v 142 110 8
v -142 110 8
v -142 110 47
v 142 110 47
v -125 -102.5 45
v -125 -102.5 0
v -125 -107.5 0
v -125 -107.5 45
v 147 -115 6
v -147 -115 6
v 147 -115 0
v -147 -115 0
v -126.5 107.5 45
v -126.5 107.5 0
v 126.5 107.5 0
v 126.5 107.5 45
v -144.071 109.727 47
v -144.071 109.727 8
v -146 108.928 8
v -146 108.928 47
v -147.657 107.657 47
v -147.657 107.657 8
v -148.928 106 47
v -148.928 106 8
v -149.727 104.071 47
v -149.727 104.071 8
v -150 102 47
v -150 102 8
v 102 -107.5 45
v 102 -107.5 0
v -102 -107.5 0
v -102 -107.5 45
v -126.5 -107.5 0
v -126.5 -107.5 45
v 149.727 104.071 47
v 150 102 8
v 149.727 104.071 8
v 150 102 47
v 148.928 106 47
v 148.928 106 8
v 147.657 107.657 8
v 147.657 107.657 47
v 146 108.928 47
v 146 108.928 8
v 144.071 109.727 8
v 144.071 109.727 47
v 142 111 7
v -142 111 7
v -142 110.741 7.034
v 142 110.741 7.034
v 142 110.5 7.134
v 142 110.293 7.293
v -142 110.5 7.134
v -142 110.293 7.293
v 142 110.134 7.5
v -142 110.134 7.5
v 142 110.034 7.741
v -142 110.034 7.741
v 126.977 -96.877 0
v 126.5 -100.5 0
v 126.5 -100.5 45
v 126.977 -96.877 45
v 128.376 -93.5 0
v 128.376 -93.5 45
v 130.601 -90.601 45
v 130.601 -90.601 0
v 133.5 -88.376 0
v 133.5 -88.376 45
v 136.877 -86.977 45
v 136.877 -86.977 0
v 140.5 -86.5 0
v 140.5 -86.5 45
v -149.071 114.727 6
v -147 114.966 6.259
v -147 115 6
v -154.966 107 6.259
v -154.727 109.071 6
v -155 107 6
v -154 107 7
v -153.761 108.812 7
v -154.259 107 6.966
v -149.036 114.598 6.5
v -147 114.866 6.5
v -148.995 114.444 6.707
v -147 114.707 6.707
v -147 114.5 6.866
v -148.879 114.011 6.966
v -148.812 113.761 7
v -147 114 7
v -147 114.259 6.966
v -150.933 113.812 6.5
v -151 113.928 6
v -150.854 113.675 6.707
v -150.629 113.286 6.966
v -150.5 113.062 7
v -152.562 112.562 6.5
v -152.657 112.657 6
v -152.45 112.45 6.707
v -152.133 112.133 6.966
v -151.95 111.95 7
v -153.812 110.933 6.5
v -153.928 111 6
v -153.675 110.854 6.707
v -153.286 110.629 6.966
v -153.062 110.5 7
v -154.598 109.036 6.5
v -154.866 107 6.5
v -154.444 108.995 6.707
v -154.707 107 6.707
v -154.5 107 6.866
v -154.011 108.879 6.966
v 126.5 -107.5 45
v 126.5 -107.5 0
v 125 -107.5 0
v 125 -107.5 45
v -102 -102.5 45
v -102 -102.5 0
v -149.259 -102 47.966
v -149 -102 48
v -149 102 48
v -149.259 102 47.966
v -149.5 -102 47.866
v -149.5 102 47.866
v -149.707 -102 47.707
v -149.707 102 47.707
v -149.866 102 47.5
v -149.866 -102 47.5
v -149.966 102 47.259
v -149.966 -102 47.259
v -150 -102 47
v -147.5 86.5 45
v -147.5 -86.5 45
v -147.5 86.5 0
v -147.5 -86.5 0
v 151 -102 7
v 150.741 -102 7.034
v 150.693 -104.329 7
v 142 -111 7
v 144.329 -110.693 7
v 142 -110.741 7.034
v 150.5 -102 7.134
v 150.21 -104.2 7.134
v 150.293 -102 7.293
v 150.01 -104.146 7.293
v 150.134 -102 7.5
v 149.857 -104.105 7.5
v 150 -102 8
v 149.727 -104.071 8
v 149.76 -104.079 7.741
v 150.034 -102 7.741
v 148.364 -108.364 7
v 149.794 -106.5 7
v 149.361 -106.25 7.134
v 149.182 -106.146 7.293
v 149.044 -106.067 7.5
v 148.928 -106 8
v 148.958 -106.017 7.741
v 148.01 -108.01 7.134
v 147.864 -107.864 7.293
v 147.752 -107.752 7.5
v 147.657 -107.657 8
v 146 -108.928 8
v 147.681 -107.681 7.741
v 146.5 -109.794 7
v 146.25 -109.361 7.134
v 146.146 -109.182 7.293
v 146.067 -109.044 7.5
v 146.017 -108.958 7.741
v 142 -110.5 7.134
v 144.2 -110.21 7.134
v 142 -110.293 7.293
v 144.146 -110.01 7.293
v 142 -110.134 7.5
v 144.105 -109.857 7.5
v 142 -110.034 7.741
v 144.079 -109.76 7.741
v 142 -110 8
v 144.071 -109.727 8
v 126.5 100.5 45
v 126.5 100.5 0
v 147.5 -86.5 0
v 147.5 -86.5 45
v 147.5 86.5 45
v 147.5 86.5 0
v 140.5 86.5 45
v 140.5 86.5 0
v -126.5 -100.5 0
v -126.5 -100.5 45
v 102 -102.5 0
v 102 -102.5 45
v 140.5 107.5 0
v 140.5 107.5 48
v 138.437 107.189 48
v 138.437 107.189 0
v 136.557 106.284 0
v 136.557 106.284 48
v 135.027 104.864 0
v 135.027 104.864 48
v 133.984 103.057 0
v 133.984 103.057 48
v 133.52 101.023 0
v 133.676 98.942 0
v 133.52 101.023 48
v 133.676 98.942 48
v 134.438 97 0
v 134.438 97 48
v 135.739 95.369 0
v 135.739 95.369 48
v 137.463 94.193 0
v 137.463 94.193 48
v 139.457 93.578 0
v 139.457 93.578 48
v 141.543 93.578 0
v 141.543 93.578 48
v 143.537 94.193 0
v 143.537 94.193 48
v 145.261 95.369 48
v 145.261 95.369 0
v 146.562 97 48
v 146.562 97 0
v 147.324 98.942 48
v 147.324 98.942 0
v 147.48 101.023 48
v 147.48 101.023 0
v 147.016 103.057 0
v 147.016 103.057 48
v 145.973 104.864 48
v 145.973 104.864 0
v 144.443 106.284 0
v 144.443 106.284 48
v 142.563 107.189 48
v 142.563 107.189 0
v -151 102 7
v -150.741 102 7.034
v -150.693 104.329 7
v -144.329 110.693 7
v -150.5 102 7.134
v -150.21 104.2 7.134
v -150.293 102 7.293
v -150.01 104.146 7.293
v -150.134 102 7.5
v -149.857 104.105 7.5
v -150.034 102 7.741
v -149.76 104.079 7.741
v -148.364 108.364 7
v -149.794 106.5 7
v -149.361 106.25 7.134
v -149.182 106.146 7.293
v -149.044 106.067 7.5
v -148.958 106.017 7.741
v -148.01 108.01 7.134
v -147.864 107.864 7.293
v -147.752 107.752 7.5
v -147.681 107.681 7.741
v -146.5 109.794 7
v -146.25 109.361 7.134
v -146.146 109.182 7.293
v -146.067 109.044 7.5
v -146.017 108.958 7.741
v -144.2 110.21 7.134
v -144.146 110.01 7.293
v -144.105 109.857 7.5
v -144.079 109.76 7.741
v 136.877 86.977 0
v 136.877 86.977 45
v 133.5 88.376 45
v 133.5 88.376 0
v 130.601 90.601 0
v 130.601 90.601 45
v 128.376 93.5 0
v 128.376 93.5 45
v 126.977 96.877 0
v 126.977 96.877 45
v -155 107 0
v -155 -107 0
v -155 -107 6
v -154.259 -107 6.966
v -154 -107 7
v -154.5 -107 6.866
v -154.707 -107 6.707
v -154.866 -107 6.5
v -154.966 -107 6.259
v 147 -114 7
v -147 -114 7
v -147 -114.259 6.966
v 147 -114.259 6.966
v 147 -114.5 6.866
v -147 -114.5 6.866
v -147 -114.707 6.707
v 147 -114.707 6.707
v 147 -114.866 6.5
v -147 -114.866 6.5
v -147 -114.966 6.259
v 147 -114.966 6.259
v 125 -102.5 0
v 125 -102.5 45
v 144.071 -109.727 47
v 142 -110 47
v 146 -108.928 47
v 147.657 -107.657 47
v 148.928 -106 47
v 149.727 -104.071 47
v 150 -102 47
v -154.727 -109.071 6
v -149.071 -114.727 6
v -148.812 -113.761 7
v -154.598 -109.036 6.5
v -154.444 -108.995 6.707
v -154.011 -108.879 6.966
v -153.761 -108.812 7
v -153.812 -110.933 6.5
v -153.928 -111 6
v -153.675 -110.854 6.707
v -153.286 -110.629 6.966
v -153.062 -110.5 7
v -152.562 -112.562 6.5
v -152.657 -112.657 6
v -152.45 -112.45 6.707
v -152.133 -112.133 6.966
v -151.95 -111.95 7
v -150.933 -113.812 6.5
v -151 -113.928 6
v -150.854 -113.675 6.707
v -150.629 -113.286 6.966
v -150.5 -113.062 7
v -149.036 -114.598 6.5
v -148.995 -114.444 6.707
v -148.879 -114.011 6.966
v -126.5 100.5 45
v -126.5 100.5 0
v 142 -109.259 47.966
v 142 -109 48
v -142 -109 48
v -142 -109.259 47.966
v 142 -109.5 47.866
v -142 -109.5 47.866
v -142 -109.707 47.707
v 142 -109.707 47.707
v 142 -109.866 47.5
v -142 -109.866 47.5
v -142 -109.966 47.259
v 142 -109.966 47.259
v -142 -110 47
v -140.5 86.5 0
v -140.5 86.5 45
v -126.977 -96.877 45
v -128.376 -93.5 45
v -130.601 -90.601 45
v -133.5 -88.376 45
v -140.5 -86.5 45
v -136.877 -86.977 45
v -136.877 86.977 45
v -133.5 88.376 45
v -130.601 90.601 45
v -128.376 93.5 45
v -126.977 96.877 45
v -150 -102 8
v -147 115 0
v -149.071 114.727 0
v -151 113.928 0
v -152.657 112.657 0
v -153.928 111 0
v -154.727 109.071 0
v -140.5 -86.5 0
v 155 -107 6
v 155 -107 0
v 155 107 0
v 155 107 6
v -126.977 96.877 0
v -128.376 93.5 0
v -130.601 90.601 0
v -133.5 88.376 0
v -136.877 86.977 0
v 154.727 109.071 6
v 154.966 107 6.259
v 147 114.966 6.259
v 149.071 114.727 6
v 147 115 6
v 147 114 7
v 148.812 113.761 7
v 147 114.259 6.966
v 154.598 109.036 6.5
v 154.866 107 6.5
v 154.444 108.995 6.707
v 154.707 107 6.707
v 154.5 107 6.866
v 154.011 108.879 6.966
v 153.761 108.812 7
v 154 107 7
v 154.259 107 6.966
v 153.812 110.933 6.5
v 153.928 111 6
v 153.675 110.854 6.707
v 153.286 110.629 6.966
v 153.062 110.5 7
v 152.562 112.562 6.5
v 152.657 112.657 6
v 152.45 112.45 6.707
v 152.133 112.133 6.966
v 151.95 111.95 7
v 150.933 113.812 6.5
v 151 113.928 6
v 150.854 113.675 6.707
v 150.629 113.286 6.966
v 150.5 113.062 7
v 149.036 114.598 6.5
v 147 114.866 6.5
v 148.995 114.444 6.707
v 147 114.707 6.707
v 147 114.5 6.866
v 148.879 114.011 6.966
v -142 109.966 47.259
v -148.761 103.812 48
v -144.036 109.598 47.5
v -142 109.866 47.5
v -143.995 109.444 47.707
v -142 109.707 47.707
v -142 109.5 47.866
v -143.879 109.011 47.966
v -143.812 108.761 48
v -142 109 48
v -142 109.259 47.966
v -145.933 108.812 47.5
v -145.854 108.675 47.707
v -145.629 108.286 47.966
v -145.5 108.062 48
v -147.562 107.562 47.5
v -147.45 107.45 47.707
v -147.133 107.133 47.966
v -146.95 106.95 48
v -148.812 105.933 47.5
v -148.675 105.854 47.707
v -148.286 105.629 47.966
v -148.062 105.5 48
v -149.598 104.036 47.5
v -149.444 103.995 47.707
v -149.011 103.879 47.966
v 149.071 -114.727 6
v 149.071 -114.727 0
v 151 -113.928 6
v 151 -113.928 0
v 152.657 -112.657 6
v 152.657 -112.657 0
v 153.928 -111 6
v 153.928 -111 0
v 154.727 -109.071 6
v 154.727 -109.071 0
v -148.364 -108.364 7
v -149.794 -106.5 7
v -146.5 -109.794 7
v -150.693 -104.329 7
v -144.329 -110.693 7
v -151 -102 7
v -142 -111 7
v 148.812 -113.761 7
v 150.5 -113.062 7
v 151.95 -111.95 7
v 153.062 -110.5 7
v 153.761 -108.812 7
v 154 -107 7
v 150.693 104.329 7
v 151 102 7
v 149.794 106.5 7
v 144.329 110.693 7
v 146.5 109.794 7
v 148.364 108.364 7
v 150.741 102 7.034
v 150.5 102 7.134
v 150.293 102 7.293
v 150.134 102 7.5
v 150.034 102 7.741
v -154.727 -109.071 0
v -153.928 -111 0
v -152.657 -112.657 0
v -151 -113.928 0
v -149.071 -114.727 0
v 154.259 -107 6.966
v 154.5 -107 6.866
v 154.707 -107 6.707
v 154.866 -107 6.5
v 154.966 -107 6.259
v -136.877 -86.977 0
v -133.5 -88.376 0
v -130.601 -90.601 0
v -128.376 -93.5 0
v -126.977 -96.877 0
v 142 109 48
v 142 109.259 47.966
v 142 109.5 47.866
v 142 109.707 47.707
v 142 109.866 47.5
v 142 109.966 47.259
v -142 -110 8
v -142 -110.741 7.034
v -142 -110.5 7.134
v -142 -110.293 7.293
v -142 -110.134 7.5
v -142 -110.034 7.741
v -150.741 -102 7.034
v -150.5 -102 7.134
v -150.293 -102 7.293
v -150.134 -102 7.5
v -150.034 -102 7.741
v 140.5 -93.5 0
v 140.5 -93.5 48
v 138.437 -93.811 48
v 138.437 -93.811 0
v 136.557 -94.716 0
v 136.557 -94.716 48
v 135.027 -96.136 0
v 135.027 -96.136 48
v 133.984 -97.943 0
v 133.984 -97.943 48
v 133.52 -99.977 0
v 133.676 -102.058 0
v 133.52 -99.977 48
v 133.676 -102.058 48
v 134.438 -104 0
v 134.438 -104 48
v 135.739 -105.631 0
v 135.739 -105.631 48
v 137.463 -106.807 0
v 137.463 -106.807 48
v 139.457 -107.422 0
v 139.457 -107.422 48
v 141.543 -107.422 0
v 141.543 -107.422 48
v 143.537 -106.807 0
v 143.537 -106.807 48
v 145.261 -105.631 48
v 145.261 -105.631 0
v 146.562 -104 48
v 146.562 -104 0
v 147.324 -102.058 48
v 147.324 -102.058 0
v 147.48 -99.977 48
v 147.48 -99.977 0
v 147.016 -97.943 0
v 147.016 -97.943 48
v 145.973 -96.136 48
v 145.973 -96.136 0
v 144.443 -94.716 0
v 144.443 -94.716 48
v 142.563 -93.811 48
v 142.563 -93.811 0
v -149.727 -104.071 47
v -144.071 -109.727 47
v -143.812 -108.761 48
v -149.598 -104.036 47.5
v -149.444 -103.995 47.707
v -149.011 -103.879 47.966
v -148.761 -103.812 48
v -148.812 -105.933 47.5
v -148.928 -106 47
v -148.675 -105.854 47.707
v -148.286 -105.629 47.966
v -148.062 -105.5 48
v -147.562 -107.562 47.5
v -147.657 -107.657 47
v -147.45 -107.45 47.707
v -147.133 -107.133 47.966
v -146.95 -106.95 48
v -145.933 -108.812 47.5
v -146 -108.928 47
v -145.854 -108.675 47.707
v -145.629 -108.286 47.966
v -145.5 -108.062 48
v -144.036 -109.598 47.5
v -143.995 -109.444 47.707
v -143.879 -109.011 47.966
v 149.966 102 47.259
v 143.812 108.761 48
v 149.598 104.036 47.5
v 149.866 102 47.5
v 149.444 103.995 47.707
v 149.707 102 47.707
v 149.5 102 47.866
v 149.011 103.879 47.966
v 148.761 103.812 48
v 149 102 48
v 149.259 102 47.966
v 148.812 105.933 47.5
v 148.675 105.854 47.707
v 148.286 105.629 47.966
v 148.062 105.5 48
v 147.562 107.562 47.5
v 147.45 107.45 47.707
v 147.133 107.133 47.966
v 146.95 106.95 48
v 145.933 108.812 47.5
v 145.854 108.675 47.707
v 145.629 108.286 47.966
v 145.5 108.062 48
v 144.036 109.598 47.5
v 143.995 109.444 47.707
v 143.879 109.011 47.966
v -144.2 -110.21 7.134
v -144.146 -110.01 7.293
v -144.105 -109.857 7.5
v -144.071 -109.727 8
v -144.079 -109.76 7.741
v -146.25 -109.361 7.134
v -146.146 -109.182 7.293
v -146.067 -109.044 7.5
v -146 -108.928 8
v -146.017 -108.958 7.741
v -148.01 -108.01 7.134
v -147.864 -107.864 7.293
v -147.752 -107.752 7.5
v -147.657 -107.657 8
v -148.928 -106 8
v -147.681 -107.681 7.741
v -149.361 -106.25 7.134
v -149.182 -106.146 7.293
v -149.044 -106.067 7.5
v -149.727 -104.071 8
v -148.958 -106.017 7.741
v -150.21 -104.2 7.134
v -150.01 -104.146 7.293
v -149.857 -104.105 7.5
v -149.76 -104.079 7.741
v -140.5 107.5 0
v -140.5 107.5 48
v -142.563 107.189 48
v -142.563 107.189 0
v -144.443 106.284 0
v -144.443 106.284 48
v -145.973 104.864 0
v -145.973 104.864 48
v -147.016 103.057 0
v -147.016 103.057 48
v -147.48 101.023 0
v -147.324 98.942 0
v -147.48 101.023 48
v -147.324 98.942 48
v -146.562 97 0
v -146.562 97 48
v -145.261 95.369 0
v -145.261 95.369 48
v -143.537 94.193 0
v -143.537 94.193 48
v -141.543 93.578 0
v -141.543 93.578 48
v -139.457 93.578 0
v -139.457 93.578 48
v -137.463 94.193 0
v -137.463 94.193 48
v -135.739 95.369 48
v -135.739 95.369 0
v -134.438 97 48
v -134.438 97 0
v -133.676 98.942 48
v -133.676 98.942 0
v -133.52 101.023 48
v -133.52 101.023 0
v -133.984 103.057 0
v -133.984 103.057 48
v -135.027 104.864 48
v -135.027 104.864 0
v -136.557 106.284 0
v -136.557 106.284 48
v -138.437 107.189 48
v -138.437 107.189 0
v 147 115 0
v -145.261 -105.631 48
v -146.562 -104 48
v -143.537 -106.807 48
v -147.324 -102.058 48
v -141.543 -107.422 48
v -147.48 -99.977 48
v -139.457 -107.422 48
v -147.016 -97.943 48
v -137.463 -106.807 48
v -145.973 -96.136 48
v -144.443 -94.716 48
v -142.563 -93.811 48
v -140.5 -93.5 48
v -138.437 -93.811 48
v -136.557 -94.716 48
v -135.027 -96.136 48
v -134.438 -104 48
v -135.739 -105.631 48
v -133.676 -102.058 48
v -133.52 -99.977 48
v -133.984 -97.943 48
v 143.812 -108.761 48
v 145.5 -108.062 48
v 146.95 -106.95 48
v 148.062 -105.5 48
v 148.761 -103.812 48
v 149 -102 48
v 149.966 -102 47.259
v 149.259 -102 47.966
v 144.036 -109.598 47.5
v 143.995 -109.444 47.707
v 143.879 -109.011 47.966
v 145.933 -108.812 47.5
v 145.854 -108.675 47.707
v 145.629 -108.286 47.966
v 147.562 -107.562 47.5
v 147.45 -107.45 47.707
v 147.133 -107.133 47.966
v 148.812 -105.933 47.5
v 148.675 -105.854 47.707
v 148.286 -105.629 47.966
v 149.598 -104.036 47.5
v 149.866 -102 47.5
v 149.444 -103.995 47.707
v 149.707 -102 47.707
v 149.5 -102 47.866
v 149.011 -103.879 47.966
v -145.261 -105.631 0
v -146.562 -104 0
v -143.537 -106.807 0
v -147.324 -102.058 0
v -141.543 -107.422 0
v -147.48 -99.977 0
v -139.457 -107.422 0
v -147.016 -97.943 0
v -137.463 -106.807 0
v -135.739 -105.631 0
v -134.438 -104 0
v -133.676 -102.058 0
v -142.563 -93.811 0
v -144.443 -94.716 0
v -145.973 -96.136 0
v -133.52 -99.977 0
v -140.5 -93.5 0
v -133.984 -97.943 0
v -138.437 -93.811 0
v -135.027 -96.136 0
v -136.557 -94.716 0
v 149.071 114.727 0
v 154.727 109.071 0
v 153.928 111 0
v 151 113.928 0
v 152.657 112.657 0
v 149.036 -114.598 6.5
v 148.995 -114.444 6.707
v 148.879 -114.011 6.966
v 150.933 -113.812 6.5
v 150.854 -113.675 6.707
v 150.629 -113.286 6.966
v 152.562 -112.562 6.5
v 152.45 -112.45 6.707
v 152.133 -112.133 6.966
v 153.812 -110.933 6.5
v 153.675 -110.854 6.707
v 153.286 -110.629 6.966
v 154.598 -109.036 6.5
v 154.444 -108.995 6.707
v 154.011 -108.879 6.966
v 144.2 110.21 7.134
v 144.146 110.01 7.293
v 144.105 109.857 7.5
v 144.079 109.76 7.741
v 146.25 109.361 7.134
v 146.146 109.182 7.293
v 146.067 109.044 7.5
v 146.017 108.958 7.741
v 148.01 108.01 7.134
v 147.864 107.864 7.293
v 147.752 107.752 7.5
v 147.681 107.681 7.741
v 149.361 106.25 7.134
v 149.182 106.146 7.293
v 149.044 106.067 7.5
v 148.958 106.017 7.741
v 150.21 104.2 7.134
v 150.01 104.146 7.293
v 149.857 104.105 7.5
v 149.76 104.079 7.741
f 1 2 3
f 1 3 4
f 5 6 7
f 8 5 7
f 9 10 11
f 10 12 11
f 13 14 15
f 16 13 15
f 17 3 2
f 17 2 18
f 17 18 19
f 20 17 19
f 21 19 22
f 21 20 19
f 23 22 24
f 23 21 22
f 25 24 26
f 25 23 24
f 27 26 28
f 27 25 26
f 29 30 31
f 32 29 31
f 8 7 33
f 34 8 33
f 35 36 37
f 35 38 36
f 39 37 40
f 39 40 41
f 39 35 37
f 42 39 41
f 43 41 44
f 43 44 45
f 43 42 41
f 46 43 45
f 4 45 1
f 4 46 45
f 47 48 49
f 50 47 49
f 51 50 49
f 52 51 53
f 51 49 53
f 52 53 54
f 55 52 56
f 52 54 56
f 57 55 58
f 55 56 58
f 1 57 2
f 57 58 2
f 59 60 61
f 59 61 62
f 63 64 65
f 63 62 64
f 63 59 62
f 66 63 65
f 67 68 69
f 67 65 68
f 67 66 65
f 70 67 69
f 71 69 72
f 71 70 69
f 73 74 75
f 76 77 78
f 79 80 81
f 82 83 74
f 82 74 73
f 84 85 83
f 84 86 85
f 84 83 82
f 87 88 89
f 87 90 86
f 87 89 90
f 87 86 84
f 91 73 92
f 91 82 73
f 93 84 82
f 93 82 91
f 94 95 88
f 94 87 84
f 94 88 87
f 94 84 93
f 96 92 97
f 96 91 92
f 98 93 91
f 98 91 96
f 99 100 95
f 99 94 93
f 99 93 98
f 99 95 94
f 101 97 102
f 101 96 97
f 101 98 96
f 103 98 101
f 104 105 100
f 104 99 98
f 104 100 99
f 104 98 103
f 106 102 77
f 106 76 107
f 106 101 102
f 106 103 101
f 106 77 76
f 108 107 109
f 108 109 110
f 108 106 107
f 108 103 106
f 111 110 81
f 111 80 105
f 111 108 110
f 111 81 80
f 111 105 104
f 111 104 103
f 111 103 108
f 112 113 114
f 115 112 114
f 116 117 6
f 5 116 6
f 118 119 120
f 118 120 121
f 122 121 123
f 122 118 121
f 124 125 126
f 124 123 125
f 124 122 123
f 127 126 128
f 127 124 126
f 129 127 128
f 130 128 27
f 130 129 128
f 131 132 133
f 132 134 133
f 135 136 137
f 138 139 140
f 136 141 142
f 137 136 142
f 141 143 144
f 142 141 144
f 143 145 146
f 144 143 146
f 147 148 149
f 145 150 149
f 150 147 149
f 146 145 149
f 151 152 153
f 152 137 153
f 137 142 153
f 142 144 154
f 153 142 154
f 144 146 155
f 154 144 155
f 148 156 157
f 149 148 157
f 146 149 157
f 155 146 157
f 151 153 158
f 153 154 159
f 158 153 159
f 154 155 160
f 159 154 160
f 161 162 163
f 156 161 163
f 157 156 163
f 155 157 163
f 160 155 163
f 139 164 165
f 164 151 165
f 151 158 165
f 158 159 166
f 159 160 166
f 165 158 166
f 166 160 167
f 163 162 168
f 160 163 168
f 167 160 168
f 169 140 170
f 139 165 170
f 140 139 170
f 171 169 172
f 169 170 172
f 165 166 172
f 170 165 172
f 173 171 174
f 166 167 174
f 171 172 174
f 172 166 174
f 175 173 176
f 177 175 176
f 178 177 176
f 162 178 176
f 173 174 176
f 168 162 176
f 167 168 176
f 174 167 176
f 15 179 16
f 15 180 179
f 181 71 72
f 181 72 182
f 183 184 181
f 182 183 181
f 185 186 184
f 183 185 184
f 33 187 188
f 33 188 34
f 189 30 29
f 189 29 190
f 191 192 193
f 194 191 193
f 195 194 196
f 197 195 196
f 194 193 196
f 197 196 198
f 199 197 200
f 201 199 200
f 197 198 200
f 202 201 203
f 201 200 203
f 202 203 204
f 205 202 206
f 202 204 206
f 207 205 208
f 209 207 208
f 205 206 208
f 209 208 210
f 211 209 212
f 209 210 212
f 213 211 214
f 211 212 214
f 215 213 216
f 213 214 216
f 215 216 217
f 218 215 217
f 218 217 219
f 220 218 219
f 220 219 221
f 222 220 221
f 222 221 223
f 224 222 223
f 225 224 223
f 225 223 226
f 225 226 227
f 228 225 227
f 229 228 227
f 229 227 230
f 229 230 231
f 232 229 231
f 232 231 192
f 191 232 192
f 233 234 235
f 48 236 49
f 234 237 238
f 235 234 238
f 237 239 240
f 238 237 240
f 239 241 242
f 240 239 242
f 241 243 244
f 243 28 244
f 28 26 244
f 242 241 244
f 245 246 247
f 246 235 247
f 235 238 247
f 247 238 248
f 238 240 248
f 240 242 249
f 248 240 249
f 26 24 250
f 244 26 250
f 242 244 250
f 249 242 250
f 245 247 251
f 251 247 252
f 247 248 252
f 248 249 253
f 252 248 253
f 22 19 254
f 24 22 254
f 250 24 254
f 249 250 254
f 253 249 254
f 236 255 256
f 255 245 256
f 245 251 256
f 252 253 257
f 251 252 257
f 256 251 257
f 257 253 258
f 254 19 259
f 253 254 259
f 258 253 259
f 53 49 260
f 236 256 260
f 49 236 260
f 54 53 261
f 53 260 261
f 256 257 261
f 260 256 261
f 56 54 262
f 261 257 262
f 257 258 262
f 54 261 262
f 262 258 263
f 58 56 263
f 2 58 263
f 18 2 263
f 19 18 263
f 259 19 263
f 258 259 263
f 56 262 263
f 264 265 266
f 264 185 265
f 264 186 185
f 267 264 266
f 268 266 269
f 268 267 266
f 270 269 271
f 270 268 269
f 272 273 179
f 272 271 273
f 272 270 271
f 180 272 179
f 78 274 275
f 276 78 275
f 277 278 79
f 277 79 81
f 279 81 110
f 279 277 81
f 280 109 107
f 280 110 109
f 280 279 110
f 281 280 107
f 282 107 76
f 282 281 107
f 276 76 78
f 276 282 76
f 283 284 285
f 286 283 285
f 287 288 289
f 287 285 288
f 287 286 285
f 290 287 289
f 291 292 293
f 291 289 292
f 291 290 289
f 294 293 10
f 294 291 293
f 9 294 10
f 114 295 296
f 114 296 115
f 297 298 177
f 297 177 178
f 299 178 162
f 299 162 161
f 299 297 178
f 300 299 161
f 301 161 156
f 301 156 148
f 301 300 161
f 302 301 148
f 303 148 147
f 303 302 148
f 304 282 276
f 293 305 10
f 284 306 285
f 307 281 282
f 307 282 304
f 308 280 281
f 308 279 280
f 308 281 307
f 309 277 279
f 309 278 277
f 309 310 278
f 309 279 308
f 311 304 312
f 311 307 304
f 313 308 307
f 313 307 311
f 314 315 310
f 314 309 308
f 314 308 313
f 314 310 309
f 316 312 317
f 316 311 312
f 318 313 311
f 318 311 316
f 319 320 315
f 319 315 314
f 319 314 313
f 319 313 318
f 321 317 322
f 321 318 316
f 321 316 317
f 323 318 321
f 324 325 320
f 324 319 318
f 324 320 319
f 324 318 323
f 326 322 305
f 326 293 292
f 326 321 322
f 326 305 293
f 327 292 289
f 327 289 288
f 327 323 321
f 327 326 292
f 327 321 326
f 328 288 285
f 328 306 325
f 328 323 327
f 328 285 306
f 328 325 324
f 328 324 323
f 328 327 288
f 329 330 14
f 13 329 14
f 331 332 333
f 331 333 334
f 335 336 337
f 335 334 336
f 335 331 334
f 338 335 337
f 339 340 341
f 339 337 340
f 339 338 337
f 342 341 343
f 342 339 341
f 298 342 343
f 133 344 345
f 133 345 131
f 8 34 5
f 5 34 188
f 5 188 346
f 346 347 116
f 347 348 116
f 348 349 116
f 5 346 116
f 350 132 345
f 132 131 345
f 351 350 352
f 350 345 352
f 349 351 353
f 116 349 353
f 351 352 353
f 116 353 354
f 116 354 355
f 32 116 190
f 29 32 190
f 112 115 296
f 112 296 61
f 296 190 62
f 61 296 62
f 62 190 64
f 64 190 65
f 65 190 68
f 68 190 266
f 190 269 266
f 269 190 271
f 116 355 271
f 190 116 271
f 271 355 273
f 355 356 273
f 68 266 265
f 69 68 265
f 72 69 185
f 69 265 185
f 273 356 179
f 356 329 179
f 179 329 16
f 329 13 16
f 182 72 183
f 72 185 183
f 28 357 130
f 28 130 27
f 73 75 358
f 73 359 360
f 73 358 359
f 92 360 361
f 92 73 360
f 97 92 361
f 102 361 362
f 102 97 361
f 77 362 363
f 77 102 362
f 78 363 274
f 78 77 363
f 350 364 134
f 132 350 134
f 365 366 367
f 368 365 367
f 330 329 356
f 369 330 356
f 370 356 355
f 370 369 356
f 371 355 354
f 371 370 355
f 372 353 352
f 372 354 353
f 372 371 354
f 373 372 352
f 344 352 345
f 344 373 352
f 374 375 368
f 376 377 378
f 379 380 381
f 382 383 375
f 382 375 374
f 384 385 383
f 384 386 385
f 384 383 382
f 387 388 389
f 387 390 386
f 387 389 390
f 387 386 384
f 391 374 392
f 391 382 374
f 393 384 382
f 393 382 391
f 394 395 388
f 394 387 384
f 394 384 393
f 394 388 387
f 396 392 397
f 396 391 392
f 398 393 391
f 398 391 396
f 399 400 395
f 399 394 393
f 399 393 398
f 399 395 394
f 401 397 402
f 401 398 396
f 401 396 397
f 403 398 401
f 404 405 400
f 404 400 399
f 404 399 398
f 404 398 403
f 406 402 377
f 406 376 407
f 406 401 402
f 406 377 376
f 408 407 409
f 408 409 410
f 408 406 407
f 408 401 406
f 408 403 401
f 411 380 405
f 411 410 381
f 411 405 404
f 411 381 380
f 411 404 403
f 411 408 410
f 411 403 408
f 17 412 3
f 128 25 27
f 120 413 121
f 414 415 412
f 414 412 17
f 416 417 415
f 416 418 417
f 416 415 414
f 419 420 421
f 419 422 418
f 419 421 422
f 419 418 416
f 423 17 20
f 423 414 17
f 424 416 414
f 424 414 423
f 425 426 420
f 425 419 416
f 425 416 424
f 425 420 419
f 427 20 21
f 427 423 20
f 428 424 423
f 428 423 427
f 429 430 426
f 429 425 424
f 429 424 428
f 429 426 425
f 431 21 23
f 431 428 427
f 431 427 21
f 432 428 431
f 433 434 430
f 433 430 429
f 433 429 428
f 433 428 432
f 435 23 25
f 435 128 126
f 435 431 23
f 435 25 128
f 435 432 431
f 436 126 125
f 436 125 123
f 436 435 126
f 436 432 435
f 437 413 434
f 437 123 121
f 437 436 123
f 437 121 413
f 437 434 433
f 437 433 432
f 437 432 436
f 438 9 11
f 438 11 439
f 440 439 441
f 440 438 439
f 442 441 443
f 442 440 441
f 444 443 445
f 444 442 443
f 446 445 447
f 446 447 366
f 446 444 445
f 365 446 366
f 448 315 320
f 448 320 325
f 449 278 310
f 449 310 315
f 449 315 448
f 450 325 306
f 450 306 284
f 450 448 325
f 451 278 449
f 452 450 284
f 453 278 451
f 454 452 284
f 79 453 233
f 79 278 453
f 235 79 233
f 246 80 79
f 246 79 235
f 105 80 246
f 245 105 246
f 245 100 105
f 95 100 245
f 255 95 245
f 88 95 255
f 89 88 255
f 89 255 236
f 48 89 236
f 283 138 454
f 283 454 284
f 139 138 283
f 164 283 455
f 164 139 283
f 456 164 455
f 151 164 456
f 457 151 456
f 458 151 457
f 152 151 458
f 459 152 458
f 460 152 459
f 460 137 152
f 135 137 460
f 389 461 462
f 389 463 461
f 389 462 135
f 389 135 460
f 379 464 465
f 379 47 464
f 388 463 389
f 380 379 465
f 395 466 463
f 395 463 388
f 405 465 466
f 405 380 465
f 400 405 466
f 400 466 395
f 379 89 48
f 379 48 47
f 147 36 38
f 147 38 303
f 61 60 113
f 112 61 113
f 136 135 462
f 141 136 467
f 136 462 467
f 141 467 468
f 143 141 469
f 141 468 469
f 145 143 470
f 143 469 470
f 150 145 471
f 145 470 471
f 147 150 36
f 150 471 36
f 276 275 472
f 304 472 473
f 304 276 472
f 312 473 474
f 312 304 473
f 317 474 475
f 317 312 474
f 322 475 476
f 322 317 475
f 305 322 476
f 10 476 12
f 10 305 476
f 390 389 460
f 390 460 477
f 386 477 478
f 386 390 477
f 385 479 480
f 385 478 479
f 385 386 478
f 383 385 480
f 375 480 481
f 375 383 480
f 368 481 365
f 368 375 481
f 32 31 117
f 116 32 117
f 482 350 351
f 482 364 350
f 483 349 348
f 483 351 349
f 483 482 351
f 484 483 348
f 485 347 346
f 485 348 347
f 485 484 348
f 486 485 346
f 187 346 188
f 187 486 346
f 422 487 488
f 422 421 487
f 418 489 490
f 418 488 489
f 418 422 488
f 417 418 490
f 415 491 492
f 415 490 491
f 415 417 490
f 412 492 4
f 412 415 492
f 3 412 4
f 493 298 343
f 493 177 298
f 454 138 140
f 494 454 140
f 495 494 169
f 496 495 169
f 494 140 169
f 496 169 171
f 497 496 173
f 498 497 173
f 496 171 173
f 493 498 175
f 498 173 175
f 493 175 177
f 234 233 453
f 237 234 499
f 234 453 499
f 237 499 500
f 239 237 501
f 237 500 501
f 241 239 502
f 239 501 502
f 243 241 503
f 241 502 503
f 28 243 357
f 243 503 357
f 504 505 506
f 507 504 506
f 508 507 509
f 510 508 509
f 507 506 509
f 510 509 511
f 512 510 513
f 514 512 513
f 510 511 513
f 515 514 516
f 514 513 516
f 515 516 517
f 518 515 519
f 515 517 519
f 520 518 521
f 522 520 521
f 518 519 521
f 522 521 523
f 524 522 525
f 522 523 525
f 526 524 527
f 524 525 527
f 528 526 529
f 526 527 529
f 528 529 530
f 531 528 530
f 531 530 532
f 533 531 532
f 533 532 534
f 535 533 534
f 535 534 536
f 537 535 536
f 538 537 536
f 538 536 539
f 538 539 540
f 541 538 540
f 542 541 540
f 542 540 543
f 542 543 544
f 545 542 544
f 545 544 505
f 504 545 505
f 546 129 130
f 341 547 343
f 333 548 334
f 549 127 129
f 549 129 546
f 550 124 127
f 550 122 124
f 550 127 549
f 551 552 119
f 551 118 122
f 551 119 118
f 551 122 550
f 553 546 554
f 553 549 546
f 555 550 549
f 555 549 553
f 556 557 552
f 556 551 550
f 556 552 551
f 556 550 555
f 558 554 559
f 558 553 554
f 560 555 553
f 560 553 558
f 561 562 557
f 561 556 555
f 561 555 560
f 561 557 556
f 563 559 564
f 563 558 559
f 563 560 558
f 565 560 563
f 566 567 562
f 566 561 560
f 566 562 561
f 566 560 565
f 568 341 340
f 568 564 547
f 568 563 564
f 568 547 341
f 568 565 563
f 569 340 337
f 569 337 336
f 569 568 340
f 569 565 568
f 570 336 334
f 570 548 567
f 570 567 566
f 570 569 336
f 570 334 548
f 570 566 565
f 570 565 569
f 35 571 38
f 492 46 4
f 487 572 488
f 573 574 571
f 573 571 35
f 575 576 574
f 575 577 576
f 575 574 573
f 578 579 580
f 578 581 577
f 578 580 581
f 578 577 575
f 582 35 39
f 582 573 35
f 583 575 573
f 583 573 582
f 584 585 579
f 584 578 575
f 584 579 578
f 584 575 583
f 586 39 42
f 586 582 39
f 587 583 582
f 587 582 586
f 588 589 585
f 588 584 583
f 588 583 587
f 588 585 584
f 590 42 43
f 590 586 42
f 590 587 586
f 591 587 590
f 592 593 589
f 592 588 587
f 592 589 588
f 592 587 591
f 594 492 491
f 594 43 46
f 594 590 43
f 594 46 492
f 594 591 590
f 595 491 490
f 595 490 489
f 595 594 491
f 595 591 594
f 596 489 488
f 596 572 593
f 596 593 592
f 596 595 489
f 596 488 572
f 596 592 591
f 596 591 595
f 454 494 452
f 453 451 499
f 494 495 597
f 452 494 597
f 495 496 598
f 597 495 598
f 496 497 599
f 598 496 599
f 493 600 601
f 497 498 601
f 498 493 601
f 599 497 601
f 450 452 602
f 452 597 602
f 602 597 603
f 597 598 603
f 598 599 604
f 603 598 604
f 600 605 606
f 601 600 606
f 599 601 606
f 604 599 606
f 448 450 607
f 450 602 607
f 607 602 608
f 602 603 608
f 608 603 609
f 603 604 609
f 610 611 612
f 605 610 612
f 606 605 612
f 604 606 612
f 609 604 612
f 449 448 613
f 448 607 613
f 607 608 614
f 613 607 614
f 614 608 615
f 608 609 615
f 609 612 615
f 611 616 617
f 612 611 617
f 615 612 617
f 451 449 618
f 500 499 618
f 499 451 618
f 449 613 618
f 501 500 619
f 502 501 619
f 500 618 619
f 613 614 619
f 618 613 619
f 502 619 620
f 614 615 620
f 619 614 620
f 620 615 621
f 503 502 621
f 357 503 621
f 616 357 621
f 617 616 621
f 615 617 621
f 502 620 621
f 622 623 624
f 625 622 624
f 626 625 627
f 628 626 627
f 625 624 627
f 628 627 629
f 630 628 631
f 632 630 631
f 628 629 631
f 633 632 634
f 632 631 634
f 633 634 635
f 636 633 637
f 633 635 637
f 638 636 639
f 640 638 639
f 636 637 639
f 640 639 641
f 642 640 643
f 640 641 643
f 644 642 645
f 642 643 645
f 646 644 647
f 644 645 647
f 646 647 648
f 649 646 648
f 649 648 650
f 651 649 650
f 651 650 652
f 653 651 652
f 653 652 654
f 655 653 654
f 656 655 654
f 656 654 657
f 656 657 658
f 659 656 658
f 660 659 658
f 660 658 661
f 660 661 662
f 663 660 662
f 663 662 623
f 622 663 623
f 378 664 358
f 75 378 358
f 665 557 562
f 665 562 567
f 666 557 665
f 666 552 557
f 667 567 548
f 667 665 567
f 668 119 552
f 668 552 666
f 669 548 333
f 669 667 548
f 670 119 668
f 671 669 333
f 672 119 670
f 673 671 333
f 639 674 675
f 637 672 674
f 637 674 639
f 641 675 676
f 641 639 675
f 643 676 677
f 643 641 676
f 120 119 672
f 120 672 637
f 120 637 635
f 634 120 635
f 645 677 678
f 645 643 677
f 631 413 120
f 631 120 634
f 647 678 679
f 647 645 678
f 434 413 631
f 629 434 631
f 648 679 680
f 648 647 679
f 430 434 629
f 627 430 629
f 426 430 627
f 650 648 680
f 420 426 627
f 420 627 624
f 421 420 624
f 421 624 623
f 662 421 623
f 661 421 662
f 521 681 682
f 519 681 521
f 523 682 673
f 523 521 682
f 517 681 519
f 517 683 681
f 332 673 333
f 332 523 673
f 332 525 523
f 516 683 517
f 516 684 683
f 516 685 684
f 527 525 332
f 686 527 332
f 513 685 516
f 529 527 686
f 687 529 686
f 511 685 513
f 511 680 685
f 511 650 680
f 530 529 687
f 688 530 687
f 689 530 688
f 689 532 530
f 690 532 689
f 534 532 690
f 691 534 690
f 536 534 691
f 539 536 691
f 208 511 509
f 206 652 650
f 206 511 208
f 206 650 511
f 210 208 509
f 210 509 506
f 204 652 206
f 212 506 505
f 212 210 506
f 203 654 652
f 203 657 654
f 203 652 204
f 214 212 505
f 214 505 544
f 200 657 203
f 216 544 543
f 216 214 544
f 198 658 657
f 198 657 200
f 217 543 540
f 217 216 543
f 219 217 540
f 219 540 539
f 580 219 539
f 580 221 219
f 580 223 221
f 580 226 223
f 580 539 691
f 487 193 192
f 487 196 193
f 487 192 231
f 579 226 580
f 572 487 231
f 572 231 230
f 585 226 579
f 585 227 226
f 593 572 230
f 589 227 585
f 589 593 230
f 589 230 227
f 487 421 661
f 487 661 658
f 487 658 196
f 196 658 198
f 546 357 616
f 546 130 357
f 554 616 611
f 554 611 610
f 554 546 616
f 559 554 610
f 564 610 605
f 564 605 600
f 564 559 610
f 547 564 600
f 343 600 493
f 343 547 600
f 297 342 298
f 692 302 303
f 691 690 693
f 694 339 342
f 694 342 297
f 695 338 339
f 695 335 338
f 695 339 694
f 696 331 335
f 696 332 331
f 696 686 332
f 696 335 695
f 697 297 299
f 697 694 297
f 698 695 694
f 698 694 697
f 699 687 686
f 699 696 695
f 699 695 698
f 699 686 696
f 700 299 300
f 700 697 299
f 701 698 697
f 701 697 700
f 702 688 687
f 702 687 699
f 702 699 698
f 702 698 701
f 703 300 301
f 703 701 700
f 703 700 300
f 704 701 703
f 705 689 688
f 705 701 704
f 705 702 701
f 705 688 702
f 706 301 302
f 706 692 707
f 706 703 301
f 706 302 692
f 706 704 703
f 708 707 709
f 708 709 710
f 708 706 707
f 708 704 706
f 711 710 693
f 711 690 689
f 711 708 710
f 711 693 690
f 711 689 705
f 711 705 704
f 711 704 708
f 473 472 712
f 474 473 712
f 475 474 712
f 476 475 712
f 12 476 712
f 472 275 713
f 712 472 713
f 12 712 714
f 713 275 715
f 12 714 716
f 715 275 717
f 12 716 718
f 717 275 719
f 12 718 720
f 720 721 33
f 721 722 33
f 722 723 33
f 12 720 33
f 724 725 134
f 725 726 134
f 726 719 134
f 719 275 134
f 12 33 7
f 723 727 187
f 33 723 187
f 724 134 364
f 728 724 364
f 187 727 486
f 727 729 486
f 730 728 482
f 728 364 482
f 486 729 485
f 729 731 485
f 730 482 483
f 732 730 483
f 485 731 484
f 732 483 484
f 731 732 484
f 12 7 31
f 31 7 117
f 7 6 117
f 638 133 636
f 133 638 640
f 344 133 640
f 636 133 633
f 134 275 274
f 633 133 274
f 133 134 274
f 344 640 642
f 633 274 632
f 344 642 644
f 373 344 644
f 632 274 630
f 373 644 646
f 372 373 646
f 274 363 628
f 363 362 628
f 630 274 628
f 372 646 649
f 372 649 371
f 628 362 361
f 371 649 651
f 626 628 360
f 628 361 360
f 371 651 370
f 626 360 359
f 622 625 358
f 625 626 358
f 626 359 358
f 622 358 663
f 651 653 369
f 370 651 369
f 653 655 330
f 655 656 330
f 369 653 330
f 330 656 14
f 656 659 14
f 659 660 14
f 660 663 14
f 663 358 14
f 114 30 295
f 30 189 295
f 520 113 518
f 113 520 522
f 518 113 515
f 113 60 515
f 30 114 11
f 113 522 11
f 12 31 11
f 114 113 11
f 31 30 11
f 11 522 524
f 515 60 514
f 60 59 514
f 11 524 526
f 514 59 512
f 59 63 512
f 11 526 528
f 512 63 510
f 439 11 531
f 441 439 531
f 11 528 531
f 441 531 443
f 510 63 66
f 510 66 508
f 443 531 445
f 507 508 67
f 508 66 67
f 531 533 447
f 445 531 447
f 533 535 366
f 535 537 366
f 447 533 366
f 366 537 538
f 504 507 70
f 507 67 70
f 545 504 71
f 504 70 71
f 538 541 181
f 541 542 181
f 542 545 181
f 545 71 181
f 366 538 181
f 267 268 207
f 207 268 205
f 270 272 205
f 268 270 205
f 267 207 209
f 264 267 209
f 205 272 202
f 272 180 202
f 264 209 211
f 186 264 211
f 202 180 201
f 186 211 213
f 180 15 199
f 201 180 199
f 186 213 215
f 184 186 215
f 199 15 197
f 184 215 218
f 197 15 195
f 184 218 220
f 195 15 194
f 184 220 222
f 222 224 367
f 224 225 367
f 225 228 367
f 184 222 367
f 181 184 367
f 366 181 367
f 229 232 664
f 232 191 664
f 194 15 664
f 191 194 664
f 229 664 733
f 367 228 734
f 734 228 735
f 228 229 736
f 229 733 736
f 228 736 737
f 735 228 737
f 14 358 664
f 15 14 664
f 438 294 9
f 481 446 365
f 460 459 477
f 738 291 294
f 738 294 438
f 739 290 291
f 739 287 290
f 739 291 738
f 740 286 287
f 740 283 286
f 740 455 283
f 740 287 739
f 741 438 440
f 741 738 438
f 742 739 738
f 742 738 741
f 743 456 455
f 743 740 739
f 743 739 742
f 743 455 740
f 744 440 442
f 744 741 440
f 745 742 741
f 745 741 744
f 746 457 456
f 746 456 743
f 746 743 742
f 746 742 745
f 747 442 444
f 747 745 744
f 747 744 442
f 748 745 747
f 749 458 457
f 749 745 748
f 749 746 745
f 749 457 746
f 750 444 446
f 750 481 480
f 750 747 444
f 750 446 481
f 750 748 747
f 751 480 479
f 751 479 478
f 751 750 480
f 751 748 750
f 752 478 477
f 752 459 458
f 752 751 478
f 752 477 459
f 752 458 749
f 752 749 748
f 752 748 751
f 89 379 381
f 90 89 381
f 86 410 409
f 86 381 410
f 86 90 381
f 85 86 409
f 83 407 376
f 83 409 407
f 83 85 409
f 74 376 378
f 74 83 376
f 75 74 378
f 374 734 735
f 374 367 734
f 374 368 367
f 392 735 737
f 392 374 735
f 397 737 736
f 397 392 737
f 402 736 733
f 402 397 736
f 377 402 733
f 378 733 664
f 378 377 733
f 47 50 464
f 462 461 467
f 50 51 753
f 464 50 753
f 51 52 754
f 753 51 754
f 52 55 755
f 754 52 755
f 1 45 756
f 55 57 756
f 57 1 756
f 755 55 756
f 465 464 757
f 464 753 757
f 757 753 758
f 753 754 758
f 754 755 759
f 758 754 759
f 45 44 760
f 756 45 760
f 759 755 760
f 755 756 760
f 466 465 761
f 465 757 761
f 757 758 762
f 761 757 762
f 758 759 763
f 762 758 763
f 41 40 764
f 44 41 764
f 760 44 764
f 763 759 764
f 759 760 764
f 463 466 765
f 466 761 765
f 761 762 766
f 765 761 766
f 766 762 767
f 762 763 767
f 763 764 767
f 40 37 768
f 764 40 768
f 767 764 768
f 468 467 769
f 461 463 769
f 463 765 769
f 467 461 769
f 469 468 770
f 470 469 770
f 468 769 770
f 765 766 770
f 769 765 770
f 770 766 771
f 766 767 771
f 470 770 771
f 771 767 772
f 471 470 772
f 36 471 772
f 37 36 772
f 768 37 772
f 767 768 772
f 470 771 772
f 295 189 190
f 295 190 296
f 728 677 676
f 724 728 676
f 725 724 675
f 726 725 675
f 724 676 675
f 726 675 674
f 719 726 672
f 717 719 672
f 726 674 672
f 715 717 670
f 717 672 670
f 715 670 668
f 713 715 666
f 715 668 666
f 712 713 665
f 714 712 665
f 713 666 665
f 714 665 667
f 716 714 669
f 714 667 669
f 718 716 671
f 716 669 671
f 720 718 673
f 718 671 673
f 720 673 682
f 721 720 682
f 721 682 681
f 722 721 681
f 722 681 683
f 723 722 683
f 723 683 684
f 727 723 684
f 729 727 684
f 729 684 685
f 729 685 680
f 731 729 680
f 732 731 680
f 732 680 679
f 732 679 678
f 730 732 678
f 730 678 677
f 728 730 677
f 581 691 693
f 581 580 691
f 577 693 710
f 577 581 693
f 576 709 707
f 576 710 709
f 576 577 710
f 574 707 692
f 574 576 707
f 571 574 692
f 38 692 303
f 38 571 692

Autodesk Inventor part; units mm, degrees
ref_plane "YZ Plane" through (0, 0, 0) normal (1, 0, 0) x (0, 1, 0)
ref_plane "XZ Plane" through (0, 0, 0) normal (0, 1, 0) x (-1, 0, 0)
ref_plane "XY Plane" through (0, 0, 0) normal (0, 0, 1) x (1, 0, 0)
sketch "Sketch1" plane through (0, 0, 0) normal (0, 0, 1) x (1, 0, 0)
  line L0 (-150, 110) -> (150, 110)
  line L1 (150, 110) -> (150, -110)
  line L2 (150, -110) -> (-150, -110)
  line L3 (-150, -110) -> (-150, 110)
  line L4 (-150, 110) -> (150, -110) construction
  line L5 (150, 110) -> (-150, -110) construction
  point P0 (0, 0)
  dimension "d0" = 300
  dimension "d1" = 220
extrude "Extrusion1" add sketch "Sketch1" along normal blind 48
sketch "Sketch2" plane through (0, 0, 0) normal (0, 0, 1) x (1, 0, 0)
  line L0 (-155, -115) -> (155, -115)
  line L1 (155, -115) -> (155, 115)
  line L2 (155, 115) -> (-155, 115)
  line L3 (-155, 115) -> (-155, -115)
  line L4 (-155, -115) -> (155, 115) construction
  line L5 (155, -115) -> (-155, 115) construction
  point P0 (0, 0)
  dimension "d4" = 310
  dimension "d5" = 230
extrude "Extrusion2" add sketch "Sketch2" along normal blind 7
fillet "Fillet1" radius 8 8 edges at (-150, -110, 27.5) (-155, -115, 3.5) (155, -115, 3.5) (150, -110, 27.5) (155, 115, 3.5) (150, 110, 27.5) (-155, 115, 3.5) (-150, 110, 27.5)
fillet "Fillet2" radius 1 24 edges at (152.6569, -112.6569, 7) (155, 0, 7) (152.6569, 112.6569, 7) (0, 115, 7) (-152.6569, 112.6569, 7) (-155, 0, 7) (-152.6569, -112.6569, 7) (0, -115, 7) (147.6569, -107.6569, 7) (150, 0, 7) (147.6569, 107.6569, 7) (0, 110, 7) (-147.6569, 107.6569, 7) (-150, 0, 7) (-147.6569, -107.6569, 7) (0, -110, 7) (147.6569, -107.6569, 48) (150, 0, 48) (147.6569, 107.6569, 48) (0, 110, 48) (-147.6569, 107.6569, 48) (-150, 0, 48) (-147.6569, -107.6569, 48) (0, -110, 48)
sketch "Sketch3" plane through (0, 0, 0) normal (0, 0, 1) x (1, 0, 0)
  line L0 (-147.5, 107.5) -> (-126.5, 107.5) construction
  line L1 (147.5, 107.5) -> (147.5, 86.5) construction
  line L2 (147.5, -107.5) -> (126.5, -107.5) construction
  line L3 (-147.5, -107.5) -> (-147.5, -86.5) construction
  line L4 (-147.5, 107.5) -> (147.5, -107.5) construction
  line L5 (147.5, 107.5) -> (-147.5, -107.5) construction
  line L6 (-140.5, 100.5) -> (140.5, 100.5) construction
  line L7 (140.5, 100.5) -> (140.5, -100.5) construction
  line L8 (140.5, -100.5) -> (-140.5, -100.5) construction
  line L9 (-140.5, -100.5) -> (-140.5, 100.5) construction
  line L10 (-140.5, 100.5) -> (140.5, -100.5) construction
  line L11 (140.5, 100.5) -> (-140.5, -100.5) construction
  circle A0 centre (-140.5, -100.5) radius 14
  circle A1 centre (140.5, -100.5) radius 14
  circle A2 centre (140.5, 100.5) radius 14
  circle A3 centre (-140.5, 100.5) radius 14
  line L12 (-140.5, -86.5) -> (-147.5, -86.5)
  line L13 (-126.5, -100.5) -> (-126.5, -107.5)
  line L14 (126.5, -100.5) -> (126.5, -107.5)
  line L15 (140.5, -86.5) -> (147.5, -86.5)
  line L16 (-126.5, 100.5) -> (-126.5, 107.5)
  line L17 (-140.5, 86.5) -> (-147.5, 86.5)
  line L18 (126.5, 100.5) -> (126.5, 107.5)
  line L19 (140.5, 86.5) -> (147.5, 86.5)
  line L20 (-147.5, -86.5) -> (-147.5, 86.5)
  line L21 (-126.5, -107.5) -> (-147.5, -107.5) construction
  line L22 (126.5, -107.5) -> (-126.5, -107.5)
  line L23 (147.5, -86.5) -> (147.5, -107.5) construction
  line L24 (147.5, 86.5) -> (147.5, -86.5)
  line L25 (126.5, 107.5) -> (147.5, 107.5) construction
  line L26 (-126.5, 107.5) -> (126.5, 107.5)
  line L27 (-147.5, 86.5) -> (-147.5, 107.5) construction
  point P0 (0, 0)
  point P1 (0, 0)
  point P2 (0, 0)
  dimension "d10" = 295
  dimension "d11" = 215
  dimension "d16" = 281
  dimension "d17" = 201
  dimension "d18" = 28
extrude "Extrusion3" cut sketch "Sketch3" along normal blind 45 contours A0 L12 L20 L17 A3 L16 L26 L18 A2 L19 L24 L15 A1 L14 L22 L13
hole "Hole1" at (-140.5, -100.5, 0) direction (0, 0, 1) diameter 14 end through all
hole "Hole2" at (140.5, -100.5, 0) direction (0, 0, 1) diameter 14 end through all
hole "Hole3" at (-140.5, 100.5, 0) direction (0, 0, 1) diameter 14 end through all
hole "Hole4" at (140.5, 100.5, 0) direction (0, 0, 1) diameter 14 end through all
sketch "Sketch4" plane through (0, 0, 0) normal (0, 0, 1) x (1, 0, 0)
  line L0 (-125, -107.5) -> (-102, -107.5)
  line L1 (-102, -107.5) -> (-102, -102.5)
  line L2 (-102, -102.5) -> (-125, -102.5)
  line L3 (-125, -102.5) -> (-125, -107.5)
  line L4 (-126.5, -107.5) -> (126.5, -107.5) projected
  line L5 (0, -107.5) -> (0, 0) construction
  line L6 (125, -107.5) -> (102, -107.5)
  line L7 (102, -107.5) -> (102, -102.5)
  line L8 (102, -102.5) -> (125, -102.5)
  line L9 (125, -102.5) -> (125, -107.5)
  dimension "d57" = 23
  dimension "d58" = 5
  dimension "d59" = 204
extrude "Extrusion4" add sketch "Sketch4" along normal up to next
properties part number "caixa-gabinete-tampa" material "ABS Plastic"
